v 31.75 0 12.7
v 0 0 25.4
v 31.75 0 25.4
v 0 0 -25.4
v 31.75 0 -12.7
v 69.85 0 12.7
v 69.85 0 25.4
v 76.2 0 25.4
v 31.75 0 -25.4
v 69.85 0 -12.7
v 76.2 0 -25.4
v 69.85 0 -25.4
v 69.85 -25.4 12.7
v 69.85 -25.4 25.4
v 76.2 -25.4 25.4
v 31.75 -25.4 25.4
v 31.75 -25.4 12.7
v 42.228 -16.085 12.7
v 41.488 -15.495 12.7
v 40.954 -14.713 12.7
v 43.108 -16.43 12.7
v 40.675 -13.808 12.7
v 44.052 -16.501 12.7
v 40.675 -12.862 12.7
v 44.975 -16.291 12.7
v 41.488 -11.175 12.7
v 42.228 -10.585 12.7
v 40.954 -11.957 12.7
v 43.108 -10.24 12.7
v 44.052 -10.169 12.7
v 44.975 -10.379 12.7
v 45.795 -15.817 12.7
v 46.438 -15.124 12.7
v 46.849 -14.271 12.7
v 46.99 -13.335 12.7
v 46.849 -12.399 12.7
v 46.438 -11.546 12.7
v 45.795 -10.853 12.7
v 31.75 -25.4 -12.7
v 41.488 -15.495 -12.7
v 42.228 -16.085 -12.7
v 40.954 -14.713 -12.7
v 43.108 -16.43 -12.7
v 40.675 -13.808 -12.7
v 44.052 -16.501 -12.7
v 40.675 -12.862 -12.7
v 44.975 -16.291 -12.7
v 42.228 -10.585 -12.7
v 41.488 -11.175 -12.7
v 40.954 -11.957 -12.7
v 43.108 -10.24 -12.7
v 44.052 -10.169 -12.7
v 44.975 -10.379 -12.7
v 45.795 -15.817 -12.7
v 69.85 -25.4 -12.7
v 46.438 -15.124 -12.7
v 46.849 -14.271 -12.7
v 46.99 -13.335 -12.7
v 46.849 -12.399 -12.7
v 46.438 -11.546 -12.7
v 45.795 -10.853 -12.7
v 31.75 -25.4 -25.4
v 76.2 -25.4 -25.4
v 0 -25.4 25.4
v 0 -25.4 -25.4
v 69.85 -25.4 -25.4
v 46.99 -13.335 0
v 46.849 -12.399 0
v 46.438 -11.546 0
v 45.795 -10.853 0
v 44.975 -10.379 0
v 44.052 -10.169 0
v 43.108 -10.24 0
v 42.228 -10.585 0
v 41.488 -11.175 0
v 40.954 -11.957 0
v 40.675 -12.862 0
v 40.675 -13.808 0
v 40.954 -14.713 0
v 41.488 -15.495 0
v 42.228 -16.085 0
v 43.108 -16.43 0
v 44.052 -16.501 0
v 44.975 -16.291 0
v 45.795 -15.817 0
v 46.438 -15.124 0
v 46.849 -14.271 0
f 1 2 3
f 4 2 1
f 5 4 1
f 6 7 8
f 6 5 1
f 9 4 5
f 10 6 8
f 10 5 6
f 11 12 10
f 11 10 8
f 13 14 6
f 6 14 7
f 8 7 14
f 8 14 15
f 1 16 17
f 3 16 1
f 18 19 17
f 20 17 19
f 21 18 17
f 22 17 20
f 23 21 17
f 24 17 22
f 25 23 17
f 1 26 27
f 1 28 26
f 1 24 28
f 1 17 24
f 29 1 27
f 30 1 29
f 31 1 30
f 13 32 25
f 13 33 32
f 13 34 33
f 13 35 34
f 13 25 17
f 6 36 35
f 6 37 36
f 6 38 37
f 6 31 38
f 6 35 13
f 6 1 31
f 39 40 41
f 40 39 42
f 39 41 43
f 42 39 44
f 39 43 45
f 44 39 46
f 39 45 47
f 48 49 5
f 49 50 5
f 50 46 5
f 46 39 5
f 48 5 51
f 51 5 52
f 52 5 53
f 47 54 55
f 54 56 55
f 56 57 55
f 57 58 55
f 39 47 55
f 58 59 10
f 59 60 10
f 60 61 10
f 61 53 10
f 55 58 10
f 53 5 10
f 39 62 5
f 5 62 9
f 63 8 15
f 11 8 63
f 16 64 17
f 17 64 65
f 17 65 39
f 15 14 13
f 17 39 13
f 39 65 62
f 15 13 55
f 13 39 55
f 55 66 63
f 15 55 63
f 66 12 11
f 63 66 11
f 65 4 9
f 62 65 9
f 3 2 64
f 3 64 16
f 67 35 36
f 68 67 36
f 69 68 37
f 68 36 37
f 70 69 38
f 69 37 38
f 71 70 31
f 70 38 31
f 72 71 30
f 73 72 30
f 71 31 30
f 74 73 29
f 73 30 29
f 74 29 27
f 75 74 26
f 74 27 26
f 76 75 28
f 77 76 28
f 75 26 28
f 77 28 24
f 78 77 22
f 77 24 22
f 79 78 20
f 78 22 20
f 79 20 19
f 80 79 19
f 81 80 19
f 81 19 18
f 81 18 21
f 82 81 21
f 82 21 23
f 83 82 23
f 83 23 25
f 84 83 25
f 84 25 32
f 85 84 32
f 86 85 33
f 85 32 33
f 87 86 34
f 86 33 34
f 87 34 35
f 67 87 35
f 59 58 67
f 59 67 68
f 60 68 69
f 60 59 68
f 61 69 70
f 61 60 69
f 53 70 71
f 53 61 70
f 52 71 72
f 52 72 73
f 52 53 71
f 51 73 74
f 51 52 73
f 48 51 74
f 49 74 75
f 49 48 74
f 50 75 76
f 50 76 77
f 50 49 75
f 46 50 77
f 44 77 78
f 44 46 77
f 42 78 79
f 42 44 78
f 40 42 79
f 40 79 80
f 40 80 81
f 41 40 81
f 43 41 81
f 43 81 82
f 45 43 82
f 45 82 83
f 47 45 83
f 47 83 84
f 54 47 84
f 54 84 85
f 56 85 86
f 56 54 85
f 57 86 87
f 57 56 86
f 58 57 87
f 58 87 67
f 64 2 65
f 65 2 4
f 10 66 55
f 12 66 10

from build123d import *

# Parameters (mm, degrees)
F0_W     = 76.2
F0_H     = 25.4
F1_DEPTH = 25.4
F2_W     = 38.1
F2_H     = 25.4
F3_DEPTH = 12.7
F4_R     = 3.175
F5_DEPTH = 12.7


with BuildPart() as f1:
    # F0 (on Front) → F1 (new body)
    with BuildSketch(Plane.XZ):
        with Locations((38.1, 12.7)):
            Rectangle(F0_W, F0_H)
    extrude(amount=F1_DEPTH)

    # F2 (on face) → F3 (cut)
    with BuildSketch(Plane.XY.offset(25.4)):
        with Locations((50.8, -12.7)):
            Rectangle(F2_W, F2_H)
    extrude(amount=-F3_DEPTH, mode=Mode.SUBTRACT)

    # F4 (on face) → F5 (cut)
    with BuildSketch(Plane.XY.offset(12.7)):
        with Locations((43.815, -13.335)):
            Circle(F4_R)
    extrude(amount=-F5_DEPTH, mode=Mode.SUBTRACT)

    # F6: F1 across plane


with BuildPart() as f1_1:
    add(f1.part)
    add(f1.part.mirror(Plane.XY))


solid = f1_1.part
